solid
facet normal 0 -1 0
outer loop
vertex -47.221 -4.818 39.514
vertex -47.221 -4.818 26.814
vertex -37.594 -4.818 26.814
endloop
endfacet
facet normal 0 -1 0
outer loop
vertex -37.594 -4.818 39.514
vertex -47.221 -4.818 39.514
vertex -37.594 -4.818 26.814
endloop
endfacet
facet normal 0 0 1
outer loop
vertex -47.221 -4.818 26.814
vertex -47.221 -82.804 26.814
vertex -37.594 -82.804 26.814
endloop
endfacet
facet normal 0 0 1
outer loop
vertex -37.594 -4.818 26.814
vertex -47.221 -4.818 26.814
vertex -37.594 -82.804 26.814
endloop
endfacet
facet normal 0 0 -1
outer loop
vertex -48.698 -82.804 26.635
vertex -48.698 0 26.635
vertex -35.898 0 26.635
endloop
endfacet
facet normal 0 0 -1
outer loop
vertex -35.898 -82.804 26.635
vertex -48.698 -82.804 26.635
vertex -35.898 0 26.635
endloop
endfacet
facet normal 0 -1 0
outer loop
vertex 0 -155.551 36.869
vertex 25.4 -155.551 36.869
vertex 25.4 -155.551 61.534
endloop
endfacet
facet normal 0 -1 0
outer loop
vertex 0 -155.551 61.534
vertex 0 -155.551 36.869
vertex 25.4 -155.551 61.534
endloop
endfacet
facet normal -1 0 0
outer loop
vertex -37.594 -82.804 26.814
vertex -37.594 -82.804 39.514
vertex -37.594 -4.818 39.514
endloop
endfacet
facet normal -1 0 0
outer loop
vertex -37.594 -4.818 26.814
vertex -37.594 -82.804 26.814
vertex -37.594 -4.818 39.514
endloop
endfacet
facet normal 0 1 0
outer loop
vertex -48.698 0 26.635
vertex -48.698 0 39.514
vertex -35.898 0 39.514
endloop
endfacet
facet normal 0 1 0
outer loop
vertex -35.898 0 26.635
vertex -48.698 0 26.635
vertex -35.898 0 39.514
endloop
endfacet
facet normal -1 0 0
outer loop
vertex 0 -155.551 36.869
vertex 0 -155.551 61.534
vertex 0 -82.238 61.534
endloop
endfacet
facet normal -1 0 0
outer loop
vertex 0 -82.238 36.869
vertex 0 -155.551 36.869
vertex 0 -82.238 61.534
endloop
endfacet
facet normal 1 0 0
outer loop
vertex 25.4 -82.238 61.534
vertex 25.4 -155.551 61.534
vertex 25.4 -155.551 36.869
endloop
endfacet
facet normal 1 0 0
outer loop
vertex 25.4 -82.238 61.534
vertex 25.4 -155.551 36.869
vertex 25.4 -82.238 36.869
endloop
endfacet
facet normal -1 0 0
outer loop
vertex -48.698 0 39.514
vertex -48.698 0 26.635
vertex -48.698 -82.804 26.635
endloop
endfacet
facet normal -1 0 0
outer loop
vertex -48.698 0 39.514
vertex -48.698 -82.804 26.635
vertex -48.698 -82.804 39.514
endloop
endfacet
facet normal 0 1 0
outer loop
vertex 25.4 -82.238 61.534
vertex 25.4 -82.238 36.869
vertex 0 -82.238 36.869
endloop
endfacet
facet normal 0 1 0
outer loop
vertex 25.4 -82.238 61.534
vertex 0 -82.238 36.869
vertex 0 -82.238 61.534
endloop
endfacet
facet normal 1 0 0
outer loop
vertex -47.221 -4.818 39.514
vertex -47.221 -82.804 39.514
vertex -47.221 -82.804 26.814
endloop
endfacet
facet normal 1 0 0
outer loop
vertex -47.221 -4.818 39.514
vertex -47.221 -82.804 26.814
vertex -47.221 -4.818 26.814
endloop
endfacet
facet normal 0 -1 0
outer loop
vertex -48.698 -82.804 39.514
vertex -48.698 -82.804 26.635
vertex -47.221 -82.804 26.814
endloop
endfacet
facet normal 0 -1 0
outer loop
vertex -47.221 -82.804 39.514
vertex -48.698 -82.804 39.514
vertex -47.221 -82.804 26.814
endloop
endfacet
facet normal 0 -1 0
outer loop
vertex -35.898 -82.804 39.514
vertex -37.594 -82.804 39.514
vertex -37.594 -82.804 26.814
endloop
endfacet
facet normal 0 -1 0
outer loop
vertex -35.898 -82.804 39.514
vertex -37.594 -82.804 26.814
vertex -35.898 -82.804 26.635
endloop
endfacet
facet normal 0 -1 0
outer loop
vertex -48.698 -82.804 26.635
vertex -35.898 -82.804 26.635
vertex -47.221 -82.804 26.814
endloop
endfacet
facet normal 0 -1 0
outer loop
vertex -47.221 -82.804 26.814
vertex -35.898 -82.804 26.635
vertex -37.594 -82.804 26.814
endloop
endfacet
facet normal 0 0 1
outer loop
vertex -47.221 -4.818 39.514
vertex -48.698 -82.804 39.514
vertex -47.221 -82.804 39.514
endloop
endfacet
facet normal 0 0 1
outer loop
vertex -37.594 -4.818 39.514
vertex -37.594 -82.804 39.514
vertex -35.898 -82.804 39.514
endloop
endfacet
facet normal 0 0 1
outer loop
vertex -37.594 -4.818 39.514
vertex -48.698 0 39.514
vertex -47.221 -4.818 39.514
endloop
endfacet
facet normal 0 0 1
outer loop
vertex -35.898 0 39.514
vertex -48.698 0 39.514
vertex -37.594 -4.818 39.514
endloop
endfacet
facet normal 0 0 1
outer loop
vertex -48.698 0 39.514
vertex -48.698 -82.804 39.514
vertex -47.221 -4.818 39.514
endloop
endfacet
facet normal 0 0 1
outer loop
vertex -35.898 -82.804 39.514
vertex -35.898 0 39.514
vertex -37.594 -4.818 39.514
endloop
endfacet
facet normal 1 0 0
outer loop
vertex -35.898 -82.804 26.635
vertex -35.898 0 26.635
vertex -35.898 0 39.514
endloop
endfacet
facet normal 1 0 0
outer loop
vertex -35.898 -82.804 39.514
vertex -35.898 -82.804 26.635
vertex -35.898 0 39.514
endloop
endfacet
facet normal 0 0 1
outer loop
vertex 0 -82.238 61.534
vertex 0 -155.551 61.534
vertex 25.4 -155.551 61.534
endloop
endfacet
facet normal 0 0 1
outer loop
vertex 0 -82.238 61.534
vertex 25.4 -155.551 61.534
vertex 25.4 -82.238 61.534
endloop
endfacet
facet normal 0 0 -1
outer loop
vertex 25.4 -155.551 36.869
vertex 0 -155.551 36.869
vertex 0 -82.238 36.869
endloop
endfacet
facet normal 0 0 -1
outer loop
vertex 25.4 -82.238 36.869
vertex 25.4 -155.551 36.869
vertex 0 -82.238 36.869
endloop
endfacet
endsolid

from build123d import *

# Parameters (mm, degrees)
F0_W     = 12.800679
F0_H     = 12.879181
F1_DEPTH = 82.804
F2_W     = 9.626262
F2_H     = 77.986487
F3_DEPTH = 12.7
F4_W     = 73.312849
F4_H     = 24.665538
F5_DEPTH = 25.4


with BuildPart() as f1:
    # F0 (on Front) → F1 (new body)
    with BuildSketch(Plane.XZ):
        with Locations((-42.297929, 33.074682)):
            Rectangle(F0_W, F0_H)
    extrude(amount=F1_DEPTH)

    # F2 (on face) → F3 (cut)
    with BuildSketch(Plane.XY.offset(39.514273)):
        with Locations((-42.407595, -43.810757)):
            Rectangle(F2_W, F2_H)
    extrude(amount=-F3_DEPTH, mode=Mode.SUBTRACT)


with BuildPart() as f5:
    # F4 (on Right) → F5 (new body)
    with BuildSketch(Plane.YZ):
        with Locations((-118.894904, 49.201647)):
            Rectangle(F4_W, F4_H)
    extrude(amount=F5_DEPTH)


solid = Compound([f1.part, f5.part])
